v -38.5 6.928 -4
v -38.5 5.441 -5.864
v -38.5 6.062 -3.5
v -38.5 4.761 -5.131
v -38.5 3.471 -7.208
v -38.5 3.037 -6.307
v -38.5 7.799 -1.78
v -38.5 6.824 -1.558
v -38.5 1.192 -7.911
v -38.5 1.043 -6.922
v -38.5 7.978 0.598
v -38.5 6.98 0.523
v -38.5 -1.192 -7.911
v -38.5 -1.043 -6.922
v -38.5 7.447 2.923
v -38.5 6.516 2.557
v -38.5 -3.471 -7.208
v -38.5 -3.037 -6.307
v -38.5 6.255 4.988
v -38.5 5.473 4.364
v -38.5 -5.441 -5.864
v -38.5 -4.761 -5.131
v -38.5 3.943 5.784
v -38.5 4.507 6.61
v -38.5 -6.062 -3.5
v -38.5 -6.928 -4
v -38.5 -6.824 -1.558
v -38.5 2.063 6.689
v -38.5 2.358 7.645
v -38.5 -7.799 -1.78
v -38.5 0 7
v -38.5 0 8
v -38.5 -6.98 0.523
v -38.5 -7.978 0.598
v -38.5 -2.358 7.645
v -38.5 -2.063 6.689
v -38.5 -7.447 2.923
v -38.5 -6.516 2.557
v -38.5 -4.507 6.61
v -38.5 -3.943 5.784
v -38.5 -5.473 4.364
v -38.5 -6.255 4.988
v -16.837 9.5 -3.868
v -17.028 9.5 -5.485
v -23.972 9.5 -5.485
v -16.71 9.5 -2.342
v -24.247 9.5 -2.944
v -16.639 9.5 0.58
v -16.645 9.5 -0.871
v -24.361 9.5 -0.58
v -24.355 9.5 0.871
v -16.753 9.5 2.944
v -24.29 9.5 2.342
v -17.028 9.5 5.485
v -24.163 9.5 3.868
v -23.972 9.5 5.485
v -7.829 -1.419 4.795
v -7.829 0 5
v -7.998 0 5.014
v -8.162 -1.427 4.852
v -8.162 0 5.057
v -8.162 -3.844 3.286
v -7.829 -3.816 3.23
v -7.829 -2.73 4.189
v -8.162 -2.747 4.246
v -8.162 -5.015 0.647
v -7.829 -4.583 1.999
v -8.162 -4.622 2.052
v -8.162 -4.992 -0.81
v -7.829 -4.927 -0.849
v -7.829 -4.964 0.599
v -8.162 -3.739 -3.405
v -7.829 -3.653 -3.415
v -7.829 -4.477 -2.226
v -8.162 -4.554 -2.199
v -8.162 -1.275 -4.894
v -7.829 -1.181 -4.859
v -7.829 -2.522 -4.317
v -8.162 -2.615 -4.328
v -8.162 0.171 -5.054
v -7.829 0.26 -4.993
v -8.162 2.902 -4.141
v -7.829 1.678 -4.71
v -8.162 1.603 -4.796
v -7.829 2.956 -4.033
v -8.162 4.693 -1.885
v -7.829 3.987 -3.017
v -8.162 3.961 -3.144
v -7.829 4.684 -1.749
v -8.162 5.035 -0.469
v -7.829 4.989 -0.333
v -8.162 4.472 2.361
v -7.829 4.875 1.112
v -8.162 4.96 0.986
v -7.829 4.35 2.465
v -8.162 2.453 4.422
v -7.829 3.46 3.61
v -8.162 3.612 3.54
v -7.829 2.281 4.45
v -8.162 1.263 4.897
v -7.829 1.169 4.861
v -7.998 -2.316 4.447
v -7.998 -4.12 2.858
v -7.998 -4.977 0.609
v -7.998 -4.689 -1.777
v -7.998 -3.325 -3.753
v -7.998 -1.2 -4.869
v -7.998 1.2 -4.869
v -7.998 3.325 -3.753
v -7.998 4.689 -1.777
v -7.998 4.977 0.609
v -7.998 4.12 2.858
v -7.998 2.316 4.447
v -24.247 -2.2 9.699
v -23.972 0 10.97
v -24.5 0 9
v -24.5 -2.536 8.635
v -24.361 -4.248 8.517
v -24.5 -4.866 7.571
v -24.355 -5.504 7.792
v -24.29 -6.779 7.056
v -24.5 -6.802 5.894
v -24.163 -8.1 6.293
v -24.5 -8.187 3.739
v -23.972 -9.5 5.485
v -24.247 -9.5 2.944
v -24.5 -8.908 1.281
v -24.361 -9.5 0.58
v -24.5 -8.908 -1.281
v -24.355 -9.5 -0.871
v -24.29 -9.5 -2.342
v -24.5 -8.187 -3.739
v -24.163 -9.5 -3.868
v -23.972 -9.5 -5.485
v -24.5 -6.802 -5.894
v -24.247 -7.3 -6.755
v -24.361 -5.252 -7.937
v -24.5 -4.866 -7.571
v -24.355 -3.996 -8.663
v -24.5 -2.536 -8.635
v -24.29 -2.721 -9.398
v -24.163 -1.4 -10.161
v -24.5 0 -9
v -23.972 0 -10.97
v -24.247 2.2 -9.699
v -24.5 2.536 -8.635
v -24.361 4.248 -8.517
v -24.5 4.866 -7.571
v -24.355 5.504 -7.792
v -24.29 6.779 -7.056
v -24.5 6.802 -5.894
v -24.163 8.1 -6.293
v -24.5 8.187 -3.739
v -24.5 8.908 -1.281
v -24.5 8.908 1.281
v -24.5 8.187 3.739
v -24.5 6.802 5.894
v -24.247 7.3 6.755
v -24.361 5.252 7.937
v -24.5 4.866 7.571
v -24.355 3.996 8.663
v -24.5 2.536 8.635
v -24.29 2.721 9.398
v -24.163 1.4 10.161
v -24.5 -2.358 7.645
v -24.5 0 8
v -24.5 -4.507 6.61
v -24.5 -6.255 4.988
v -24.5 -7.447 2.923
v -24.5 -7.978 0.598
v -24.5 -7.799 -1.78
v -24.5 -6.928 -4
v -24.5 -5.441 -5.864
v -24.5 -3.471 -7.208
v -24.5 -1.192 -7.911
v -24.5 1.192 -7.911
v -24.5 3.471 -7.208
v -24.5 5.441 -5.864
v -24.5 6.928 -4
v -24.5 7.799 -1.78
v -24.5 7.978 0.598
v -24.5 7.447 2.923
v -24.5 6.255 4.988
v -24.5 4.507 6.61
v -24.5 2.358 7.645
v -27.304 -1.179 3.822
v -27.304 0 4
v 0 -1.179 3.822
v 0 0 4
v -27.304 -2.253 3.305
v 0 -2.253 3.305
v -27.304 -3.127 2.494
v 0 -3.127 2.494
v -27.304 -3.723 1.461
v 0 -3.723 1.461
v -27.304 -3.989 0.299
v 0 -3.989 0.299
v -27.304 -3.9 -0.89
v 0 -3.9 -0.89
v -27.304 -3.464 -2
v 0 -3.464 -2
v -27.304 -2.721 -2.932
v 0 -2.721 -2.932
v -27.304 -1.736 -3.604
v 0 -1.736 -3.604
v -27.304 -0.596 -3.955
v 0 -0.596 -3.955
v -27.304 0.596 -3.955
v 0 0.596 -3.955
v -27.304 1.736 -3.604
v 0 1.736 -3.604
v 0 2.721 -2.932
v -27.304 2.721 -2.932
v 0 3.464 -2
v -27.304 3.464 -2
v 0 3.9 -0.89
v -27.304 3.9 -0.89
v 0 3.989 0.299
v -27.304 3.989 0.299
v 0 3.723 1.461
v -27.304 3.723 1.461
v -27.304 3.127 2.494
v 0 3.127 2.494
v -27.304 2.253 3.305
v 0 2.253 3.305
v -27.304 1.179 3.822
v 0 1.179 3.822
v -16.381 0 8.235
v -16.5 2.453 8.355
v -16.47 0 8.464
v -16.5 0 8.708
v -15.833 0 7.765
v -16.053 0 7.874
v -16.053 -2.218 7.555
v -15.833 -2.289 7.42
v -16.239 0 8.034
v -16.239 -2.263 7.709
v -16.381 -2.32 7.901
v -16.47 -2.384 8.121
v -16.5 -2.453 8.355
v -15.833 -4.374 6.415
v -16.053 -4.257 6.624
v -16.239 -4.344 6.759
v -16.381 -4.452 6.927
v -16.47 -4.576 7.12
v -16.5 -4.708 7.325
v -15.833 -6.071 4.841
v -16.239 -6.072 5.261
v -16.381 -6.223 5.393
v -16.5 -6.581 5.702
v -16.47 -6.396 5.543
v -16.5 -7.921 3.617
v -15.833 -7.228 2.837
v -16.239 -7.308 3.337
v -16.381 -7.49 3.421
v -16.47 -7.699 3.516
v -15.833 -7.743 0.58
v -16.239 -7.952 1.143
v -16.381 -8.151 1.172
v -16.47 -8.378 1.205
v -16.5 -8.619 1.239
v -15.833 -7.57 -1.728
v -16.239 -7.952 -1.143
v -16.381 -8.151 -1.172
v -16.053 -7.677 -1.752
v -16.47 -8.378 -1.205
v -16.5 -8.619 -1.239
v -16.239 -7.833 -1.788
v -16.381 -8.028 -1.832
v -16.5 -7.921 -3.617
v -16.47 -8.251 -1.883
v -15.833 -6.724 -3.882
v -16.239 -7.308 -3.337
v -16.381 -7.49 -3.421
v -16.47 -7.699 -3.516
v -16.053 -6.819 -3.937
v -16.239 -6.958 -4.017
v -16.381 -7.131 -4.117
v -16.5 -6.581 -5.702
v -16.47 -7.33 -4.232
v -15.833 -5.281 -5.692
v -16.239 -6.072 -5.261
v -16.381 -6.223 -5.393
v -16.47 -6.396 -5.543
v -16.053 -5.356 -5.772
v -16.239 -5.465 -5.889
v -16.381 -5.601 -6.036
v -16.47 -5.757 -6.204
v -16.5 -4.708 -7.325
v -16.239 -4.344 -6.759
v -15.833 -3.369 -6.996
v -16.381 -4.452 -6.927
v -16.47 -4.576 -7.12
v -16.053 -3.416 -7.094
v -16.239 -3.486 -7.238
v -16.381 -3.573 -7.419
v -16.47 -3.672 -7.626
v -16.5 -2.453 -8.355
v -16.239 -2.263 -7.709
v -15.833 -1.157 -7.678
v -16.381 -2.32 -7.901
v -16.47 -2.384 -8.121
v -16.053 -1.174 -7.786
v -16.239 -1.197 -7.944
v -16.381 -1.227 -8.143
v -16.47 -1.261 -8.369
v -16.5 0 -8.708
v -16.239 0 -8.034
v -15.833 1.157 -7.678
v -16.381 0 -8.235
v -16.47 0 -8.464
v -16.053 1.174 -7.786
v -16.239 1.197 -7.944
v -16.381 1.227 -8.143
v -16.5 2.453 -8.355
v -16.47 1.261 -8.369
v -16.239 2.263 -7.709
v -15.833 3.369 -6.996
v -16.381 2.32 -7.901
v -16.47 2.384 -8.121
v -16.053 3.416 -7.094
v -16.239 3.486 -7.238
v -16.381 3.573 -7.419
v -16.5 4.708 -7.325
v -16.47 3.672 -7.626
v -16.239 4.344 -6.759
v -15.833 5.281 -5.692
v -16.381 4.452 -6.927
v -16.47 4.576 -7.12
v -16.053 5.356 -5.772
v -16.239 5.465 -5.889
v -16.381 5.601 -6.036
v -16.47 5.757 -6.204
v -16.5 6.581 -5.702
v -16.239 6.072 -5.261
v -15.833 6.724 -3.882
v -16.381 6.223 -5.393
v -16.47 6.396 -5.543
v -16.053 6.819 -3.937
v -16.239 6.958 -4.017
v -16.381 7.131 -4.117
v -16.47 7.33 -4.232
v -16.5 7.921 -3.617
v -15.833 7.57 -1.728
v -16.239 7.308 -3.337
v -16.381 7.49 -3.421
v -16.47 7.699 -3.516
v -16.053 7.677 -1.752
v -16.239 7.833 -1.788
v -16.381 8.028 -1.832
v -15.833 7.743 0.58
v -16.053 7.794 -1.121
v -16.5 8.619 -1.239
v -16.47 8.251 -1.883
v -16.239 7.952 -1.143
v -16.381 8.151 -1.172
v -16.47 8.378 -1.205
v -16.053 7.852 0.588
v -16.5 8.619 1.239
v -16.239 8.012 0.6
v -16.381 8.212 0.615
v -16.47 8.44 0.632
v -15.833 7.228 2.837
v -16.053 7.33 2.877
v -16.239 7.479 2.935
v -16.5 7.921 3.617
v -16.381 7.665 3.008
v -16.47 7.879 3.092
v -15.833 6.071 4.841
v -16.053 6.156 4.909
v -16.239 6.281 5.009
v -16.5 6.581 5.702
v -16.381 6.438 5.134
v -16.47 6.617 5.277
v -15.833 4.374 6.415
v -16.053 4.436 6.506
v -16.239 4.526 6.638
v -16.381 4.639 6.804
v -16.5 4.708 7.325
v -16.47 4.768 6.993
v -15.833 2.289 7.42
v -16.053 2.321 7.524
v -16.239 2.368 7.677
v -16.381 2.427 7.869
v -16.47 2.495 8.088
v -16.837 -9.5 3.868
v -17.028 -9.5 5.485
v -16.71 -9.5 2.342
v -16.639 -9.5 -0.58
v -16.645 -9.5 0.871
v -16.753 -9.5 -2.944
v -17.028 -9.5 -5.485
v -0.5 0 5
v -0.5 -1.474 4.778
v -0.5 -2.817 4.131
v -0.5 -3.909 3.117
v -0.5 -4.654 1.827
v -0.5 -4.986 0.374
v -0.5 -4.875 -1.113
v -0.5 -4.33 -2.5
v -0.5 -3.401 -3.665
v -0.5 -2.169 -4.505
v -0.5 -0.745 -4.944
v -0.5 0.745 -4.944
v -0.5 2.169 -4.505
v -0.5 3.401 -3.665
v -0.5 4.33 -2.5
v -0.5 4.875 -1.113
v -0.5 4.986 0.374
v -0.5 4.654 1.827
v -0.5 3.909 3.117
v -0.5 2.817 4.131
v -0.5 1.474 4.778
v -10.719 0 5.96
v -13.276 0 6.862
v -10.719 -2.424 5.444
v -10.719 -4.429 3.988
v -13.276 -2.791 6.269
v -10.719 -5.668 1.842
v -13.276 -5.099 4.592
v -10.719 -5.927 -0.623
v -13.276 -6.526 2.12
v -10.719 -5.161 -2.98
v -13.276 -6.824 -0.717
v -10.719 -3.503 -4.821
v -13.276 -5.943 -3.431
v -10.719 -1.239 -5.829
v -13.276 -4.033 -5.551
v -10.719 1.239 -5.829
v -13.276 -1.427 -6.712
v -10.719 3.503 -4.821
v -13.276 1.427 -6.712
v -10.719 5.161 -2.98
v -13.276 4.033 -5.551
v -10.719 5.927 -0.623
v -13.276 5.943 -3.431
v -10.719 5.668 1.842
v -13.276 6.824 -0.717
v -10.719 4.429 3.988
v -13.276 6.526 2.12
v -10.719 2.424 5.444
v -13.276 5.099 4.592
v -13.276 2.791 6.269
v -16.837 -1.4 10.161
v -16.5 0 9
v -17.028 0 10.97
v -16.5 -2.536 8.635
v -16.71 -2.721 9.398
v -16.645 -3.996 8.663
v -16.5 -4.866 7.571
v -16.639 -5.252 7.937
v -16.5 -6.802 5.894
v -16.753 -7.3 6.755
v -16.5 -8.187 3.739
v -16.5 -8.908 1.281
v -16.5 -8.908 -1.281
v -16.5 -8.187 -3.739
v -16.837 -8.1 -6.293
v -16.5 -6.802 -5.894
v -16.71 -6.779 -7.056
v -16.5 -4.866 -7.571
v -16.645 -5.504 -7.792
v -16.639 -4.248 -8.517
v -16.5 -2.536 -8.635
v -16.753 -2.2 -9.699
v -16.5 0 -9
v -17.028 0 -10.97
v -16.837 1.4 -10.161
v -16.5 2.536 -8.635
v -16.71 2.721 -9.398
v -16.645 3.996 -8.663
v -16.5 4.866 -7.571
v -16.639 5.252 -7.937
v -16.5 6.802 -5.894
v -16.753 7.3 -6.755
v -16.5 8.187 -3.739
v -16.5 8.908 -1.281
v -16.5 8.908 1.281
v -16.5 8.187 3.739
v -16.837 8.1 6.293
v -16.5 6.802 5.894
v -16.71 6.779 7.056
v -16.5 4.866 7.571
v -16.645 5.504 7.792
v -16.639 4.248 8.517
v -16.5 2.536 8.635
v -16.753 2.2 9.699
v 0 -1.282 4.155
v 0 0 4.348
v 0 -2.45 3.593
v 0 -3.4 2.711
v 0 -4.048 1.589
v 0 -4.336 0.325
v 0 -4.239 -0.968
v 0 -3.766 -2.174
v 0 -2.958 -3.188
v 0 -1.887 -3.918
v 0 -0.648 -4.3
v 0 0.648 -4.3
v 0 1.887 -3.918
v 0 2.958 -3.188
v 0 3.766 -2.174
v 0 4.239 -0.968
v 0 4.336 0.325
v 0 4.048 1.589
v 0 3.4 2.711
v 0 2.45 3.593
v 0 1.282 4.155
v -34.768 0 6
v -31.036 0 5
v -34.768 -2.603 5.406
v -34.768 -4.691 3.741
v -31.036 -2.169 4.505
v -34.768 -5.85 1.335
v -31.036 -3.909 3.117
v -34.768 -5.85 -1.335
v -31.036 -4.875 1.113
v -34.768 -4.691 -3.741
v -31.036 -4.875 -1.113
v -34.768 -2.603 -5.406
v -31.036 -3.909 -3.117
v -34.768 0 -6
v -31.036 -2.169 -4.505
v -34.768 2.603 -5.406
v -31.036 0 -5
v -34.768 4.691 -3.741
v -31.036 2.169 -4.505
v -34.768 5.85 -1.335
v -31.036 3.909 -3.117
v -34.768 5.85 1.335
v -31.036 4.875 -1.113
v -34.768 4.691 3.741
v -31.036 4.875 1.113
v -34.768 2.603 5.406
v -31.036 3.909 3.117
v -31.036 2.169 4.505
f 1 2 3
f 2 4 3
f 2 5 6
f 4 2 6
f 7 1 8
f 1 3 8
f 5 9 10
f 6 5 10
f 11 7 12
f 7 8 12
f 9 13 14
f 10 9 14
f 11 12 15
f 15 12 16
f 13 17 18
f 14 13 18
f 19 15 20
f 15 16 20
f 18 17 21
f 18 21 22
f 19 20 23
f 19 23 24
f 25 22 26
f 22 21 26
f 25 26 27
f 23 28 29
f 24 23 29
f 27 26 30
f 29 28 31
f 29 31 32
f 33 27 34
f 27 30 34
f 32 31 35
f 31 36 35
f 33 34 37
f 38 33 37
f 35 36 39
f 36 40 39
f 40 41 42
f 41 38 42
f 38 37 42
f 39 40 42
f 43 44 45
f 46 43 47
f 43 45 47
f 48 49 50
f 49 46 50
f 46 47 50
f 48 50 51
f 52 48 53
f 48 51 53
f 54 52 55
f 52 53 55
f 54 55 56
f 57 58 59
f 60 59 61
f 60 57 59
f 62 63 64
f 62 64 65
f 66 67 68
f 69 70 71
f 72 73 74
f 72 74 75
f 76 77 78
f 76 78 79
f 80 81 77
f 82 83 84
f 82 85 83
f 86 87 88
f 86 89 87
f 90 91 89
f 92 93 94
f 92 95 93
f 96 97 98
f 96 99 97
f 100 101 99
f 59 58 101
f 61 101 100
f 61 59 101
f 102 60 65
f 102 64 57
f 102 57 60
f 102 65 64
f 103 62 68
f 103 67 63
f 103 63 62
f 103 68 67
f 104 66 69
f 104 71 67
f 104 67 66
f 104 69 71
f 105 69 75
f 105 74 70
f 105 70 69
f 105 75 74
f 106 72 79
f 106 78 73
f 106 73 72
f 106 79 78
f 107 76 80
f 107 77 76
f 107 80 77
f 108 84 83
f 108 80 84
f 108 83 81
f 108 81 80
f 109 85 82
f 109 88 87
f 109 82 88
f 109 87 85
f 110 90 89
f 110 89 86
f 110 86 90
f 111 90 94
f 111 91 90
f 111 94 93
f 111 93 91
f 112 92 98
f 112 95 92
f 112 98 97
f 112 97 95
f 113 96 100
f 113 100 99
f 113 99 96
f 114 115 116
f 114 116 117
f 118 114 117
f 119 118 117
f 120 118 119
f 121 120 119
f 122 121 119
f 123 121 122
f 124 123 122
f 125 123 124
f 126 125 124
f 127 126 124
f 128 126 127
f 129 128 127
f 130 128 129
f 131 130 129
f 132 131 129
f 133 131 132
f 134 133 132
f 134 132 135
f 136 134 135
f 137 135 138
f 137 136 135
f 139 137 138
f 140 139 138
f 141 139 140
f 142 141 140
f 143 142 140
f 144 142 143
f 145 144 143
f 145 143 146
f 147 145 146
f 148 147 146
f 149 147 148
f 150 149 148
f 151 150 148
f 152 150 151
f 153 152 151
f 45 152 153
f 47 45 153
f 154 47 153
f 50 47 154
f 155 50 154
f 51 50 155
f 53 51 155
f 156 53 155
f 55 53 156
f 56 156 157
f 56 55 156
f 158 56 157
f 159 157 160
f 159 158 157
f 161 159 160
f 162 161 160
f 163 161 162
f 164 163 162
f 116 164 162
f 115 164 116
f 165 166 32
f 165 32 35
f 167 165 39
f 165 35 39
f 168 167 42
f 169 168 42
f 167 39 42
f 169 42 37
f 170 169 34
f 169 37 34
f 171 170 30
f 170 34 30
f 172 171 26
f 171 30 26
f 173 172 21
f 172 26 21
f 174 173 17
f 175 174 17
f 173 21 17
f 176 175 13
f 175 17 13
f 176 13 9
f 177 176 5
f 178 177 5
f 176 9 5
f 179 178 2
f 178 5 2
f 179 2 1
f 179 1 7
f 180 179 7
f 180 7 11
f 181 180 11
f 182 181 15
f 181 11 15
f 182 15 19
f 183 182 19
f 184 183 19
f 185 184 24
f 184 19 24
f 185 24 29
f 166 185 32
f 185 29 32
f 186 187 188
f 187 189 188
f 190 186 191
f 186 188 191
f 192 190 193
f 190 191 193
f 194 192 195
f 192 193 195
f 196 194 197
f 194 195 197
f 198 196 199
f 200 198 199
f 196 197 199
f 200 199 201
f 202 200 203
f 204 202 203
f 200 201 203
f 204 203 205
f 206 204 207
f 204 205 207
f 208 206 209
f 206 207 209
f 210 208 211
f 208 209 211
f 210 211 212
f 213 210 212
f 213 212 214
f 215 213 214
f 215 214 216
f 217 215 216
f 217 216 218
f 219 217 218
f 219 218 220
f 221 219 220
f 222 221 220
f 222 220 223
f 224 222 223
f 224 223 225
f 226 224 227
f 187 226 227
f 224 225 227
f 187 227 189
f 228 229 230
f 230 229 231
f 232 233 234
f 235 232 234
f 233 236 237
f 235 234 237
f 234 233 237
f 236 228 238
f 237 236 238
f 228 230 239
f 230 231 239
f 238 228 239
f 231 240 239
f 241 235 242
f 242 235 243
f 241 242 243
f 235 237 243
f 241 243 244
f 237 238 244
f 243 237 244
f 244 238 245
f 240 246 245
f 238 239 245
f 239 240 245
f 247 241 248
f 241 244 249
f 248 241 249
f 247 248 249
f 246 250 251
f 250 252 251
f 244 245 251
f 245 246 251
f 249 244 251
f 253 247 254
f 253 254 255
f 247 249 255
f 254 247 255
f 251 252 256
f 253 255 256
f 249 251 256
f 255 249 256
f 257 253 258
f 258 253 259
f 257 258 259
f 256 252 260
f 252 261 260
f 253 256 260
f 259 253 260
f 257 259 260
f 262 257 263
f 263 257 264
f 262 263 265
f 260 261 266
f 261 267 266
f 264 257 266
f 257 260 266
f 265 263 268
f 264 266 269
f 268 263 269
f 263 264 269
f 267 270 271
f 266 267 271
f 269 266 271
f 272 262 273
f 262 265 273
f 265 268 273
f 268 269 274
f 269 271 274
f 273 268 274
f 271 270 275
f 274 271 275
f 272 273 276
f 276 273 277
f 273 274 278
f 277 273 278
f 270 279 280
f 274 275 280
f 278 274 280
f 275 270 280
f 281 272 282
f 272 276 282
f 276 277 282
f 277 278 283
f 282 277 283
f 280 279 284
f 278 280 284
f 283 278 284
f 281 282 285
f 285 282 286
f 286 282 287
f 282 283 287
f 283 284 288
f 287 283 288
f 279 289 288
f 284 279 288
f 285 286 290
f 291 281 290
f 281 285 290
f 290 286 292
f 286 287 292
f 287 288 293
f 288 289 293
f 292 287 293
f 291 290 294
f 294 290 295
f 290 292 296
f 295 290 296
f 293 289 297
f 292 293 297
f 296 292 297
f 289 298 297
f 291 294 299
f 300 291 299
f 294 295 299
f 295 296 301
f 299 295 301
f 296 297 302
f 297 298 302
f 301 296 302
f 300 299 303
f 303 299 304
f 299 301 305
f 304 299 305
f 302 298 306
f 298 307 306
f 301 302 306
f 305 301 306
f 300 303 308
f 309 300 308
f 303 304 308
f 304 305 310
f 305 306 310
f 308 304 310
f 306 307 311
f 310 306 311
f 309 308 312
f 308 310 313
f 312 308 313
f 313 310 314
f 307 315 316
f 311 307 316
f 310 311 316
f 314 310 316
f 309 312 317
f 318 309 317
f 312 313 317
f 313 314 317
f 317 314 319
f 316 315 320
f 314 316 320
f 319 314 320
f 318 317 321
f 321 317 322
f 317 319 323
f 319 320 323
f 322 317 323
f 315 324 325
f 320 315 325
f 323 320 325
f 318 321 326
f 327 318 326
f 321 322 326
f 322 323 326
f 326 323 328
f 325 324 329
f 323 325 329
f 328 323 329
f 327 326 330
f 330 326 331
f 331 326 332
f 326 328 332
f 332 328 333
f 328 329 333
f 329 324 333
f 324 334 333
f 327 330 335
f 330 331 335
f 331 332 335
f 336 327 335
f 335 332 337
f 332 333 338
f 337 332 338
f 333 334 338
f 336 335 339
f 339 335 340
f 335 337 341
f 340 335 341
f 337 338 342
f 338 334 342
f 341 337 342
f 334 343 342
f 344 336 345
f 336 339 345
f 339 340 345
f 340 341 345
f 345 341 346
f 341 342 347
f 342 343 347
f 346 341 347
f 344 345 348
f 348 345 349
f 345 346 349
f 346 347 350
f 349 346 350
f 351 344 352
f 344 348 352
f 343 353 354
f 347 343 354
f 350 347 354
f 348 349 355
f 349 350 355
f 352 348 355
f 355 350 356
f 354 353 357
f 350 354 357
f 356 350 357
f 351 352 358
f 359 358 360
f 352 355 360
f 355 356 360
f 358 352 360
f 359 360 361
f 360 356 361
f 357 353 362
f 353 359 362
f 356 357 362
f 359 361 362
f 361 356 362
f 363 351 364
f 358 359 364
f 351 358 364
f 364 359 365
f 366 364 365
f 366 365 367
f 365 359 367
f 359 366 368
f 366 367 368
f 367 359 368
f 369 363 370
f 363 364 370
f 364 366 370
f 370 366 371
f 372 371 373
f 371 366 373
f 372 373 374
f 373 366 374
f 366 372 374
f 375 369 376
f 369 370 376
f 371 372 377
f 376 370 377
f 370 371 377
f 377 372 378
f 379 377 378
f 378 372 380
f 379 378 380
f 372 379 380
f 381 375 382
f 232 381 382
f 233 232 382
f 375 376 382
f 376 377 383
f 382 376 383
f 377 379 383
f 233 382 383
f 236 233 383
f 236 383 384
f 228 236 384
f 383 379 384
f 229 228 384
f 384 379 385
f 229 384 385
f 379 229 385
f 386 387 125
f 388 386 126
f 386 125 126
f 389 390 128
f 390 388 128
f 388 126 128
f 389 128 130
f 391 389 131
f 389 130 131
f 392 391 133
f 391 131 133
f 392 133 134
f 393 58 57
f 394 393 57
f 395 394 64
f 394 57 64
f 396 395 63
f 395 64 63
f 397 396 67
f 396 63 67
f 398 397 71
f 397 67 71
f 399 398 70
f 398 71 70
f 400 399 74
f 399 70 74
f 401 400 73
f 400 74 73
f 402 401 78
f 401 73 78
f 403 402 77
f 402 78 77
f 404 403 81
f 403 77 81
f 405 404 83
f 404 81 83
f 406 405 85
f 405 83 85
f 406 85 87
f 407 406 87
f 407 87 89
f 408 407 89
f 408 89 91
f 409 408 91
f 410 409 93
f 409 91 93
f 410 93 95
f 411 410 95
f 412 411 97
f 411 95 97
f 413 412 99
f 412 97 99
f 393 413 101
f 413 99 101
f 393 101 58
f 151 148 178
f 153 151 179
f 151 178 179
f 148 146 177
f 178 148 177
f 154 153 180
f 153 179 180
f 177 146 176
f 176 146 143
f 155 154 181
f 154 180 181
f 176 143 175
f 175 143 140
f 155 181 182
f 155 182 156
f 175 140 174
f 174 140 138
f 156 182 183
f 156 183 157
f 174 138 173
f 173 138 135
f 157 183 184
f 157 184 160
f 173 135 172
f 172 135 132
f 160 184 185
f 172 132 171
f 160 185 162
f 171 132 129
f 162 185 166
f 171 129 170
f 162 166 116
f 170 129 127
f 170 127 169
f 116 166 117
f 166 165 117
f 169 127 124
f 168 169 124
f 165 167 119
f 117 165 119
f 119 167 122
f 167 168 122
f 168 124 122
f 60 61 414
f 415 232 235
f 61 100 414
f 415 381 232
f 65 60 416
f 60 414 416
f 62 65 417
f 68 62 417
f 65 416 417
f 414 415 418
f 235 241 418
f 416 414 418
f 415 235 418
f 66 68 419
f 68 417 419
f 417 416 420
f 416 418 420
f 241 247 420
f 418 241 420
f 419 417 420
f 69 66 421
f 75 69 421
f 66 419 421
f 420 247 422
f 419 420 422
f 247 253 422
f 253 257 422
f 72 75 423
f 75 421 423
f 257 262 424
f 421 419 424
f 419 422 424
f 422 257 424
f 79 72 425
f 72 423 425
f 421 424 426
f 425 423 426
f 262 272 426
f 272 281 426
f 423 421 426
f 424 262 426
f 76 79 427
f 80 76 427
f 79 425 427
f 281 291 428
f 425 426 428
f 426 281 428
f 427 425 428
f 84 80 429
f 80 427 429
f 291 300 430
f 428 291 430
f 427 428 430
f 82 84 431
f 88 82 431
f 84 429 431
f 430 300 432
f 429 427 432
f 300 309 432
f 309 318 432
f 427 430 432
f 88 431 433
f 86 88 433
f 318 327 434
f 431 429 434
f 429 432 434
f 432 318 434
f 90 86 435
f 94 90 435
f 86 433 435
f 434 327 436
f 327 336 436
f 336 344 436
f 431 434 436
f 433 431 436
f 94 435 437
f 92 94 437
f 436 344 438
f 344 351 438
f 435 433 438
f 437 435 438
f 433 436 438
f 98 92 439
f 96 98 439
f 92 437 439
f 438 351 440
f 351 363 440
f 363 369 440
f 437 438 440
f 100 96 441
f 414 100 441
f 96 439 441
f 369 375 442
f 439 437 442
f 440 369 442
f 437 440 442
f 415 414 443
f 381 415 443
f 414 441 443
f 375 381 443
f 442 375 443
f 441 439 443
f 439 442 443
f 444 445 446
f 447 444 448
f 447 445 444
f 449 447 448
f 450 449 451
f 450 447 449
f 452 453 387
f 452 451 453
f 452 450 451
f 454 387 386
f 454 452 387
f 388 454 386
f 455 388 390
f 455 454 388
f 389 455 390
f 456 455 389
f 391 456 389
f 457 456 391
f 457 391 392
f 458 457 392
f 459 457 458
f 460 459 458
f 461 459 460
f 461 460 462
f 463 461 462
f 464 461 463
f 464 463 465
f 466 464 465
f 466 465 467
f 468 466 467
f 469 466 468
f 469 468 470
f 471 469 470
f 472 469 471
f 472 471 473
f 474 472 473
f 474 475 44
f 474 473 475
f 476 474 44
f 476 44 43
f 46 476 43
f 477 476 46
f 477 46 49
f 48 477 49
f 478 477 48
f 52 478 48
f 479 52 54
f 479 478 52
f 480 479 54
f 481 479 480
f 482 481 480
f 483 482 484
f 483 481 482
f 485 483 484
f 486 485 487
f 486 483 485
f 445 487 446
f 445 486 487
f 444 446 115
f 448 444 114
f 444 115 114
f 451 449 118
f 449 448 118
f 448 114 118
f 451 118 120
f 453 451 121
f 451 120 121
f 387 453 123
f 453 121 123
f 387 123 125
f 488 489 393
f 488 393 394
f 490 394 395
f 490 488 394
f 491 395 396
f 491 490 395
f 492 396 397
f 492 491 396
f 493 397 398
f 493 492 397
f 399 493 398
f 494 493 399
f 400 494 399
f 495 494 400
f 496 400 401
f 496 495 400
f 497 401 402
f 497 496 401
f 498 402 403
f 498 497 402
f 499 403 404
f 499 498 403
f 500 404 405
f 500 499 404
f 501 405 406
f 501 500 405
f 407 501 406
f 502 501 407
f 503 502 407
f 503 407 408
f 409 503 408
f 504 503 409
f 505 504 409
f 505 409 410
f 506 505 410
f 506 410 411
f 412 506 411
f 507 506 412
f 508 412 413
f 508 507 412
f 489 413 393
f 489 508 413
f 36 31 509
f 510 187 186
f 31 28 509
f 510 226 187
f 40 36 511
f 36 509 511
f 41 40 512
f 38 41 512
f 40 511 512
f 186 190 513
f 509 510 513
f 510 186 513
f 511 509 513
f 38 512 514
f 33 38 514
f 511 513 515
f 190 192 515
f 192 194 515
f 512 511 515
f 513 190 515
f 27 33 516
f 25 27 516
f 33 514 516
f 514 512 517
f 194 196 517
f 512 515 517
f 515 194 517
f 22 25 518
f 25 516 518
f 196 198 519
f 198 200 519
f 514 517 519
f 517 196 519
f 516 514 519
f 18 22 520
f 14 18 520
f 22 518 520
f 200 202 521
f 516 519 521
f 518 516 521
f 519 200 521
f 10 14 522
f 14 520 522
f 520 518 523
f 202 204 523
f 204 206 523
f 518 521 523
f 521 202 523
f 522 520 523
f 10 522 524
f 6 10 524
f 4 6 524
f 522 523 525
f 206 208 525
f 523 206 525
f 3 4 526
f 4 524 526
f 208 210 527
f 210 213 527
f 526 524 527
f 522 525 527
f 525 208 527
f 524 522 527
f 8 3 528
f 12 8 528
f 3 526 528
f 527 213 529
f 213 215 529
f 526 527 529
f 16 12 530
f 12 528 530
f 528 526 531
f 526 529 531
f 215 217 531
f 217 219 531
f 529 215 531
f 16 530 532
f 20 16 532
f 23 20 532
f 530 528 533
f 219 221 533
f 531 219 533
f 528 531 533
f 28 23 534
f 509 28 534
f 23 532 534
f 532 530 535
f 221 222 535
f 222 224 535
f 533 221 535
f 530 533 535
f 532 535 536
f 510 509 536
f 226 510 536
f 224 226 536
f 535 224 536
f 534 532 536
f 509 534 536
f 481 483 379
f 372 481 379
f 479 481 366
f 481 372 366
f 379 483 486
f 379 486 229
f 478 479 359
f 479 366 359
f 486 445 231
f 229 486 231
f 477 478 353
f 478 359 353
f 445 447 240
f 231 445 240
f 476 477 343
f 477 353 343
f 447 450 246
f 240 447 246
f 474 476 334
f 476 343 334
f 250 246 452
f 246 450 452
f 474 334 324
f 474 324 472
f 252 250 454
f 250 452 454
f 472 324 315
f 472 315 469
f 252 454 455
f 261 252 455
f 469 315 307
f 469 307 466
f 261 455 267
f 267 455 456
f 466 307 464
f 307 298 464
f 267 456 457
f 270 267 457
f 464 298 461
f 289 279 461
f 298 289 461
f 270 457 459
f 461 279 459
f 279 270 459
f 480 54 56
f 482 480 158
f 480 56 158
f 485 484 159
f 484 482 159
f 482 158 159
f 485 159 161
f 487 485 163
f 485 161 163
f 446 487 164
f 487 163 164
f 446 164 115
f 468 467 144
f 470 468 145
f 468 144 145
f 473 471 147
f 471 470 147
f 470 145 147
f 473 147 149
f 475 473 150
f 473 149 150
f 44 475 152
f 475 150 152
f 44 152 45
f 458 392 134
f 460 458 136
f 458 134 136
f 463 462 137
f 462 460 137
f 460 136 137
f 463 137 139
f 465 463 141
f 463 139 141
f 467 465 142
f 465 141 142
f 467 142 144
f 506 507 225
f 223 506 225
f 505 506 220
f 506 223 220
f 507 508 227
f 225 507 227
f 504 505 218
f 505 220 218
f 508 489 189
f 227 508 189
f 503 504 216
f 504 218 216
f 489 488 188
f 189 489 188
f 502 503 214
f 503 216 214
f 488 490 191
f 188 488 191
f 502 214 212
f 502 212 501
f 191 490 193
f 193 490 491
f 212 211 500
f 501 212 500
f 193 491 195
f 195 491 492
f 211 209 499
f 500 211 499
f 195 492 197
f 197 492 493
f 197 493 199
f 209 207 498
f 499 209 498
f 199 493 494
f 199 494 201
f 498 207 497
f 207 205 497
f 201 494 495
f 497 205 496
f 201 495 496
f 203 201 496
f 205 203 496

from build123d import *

# Parameters (mm, degrees)
F2_SIZE2 = 0.6516126864
F2_SIZE  = 0.5
F3_R     = 1
F4_R     = 12
F5_DEPTH = 25


with BuildPart() as f1:
    # F0 (on Front) → F1 (revolve)
    with BuildSketch(Plane.XZ):
        Polygon((-27.3038475773, 4), (0, 4), (0, 5), (-8, 5), (-16.5, 8), (-16.5, 12), (-24.5, 12), (-24.5, 8), (-38.5, 8), (-38.5, 7), align=None)
    revolve(axis=Axis((0.1931033472, 0, 0), (1, 0, 0)))

    # F2
    f2_edges = [f1.edges().sort_by_distance(p)[0] for p in [
        (0, 0, -5),
    ]]
    f2_side = f1.faces().sort_by_distance((-4, 0, -5))[0]
    chamfer(f2_edges, length=F2_SIZE, length2=F2_SIZE2, reference=f2_side)

    # F3
    f3_edges = [f1.edges().sort_by_distance(p)[0] for p in [
        (-16.5, 0, -8),
        (-8, 0, -5),
    ]]
    fillet(f3_edges, radius=F3_R)

    # F4 (on face) → F5 (cut)
    with BuildSketch(Plane(origin=(-24.5, 0, 0), x_dir=(0, -1, 0), z_dir=(-1, 0, 0))):
        Circle(F4_R)
        Polygon((-9.5, -5.4848275573), (-9.5, 5.4848275573), (0, 10.9696551146), (9.5, 5.4848275573), (9.5, -5.4848275573), (0, -10.9696551146), align=None, mode=Mode.SUBTRACT)
    extrude(amount=-F5_DEPTH, mode=Mode.SUBTRACT)

    # F6 (on Front) → F7 (revolve, cut)
    with BuildSketch(Plane.XZ):
        Polygon((-24.5, 13.6036825632), (-24.5, 10.9696551146), (-24.5, 9), (-23.266446975, 13.6036825632), align=None)
        Polygon((-17.733553025, 13.6036825632), (-16.5, 9), (-16.5, 10.9696551146), (-16.5, 13.6036825632), align=None)
    revolve(axis=Axis((5.1041673869, 0, 0), (1, 0, 0)), mode=Mode.SUBTRACT)


solid = f1.part
